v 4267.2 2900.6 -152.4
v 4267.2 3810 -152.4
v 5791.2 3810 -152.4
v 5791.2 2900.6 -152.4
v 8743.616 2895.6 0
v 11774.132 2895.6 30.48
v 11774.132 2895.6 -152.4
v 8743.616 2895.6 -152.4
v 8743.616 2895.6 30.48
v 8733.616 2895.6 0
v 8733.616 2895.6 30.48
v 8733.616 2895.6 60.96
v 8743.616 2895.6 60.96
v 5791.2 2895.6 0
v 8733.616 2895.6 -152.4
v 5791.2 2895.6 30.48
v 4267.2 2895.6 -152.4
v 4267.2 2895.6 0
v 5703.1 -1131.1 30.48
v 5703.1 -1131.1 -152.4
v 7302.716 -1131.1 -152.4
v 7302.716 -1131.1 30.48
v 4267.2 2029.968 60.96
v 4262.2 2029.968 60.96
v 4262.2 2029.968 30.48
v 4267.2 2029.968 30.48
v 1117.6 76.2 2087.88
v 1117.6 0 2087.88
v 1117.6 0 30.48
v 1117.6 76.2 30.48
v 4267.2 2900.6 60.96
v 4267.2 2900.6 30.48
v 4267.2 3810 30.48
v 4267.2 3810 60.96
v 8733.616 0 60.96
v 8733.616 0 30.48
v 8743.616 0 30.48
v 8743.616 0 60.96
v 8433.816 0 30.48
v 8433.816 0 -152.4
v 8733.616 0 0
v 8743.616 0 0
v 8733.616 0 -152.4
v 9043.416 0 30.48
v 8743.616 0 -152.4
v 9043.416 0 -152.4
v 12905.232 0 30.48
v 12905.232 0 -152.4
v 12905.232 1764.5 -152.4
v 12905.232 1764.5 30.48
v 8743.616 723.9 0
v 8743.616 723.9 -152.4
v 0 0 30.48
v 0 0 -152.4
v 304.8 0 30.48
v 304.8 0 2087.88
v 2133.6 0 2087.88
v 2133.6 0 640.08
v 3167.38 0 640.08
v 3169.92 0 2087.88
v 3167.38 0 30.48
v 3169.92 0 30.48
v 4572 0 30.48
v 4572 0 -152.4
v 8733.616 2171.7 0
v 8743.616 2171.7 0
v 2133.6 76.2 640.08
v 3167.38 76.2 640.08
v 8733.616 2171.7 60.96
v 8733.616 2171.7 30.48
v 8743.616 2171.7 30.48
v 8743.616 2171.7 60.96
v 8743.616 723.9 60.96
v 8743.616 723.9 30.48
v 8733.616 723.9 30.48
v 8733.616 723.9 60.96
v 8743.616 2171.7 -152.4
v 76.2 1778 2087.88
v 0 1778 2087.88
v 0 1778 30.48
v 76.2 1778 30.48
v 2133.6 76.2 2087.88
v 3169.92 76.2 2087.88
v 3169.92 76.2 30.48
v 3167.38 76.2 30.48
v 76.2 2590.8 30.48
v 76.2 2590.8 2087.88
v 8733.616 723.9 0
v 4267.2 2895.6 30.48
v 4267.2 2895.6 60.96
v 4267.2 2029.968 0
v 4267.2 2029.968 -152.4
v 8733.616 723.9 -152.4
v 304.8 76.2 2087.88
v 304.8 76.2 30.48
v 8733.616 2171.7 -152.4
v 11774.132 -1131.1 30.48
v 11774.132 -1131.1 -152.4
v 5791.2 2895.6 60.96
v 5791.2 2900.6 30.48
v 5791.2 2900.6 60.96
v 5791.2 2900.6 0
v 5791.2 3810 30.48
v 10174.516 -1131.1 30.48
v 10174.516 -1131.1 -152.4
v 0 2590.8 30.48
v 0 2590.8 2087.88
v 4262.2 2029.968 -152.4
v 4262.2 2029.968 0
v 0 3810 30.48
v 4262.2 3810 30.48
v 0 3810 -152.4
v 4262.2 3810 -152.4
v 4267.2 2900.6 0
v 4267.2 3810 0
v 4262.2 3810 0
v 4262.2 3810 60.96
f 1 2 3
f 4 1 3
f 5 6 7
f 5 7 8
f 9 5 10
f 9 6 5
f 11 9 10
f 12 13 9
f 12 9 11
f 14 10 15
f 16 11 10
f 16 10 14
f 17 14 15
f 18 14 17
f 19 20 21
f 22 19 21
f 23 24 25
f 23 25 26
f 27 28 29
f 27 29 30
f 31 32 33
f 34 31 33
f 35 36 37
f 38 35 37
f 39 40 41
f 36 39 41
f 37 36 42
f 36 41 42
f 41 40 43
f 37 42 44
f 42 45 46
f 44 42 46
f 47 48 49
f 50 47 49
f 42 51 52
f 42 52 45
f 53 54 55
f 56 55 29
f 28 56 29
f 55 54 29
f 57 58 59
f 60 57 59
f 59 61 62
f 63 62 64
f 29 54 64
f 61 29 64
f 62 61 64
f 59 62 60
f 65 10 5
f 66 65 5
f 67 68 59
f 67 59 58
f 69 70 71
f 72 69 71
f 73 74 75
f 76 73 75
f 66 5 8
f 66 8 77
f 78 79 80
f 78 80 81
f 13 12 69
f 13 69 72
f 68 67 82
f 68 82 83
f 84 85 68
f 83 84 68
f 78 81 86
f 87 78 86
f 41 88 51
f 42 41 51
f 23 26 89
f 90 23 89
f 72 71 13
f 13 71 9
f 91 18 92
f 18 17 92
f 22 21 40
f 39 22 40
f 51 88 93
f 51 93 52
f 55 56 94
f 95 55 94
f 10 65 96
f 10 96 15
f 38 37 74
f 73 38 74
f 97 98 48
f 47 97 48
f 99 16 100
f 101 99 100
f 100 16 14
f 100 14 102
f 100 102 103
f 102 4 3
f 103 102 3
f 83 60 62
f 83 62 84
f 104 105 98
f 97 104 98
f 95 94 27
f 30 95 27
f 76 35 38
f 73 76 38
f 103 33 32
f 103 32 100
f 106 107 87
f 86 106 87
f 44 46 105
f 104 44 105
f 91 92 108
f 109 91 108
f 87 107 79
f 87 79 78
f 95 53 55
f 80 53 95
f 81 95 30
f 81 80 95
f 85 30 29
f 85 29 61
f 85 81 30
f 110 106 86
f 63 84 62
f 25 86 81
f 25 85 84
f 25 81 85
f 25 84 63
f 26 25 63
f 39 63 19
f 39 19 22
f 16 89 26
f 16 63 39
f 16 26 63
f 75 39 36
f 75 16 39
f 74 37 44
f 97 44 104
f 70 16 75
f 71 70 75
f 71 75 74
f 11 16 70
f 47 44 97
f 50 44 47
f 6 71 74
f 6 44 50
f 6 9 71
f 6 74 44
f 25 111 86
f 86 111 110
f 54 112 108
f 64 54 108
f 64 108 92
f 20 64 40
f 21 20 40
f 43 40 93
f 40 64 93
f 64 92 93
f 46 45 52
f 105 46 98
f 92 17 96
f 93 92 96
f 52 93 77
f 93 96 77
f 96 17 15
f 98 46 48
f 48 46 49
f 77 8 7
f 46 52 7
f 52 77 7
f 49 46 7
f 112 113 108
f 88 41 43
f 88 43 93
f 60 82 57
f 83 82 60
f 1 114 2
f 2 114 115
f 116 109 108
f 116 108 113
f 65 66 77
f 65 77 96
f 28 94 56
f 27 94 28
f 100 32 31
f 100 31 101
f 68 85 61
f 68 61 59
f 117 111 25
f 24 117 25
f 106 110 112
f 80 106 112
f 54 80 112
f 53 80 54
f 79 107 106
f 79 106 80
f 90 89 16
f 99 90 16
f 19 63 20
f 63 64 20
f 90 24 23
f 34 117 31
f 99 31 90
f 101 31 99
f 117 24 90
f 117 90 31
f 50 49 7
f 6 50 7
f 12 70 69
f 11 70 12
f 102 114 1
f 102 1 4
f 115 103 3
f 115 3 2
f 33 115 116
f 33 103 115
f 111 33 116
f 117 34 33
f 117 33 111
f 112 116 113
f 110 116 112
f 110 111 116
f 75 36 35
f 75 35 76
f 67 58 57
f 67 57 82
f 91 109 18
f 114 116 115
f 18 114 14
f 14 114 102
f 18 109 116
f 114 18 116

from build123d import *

# Parameters (mm, degrees)
F0_W          = 1524
F0_H          = 5
F1_DEPTH      = 60.96
F0_W_2        = 5
F0_H_2        = 723.9
F0_W_3        = 5.000104126
F0_W_4        = 2286
F0_H_3        = 914.4
F0_W_5        = 1828.8
F0_H_4        = 487.68
F0_W_6        = 1310.64
F0_H_5        = 457.2
F0_W_7        = 990.6
F0_H_6        = 609.6
F0_W_8        = 914.4
F0_H_7        = 1524
F0_W_9        = 1584.96
F0_H_8        = 2157.984
F0_W_10       = 3352.8
F0_H_9        = 909.4
F0_H_10       = 280.416
F2_DEPTH      = 30.48
F4_W          = 76.2
F4_H          = 812.8
F4_W_2        = 812.8
F4_H_2        = 76.2
F4_W_3        = 1036.32
F5_DEPTH      = 2057.4
F6_W          = 1033.78
F6_H          = 609.6
F7_DEPTH      = 1207.3007187053
F8_DEPTH      = 152.4
F9_DEPTH      = 152.4
F9_DEPTH_BACK = 30.48


with BuildPart() as f1:
    # F0 (on Top) → F1 (new body)
    with BuildSketch(Plane.XY):
        with Locations((5029.2, 2898.1)):
            Rectangle(F0_W, F0_H)
        Polygon((4262.2, 3810), (4262.2, 2029.968), (4267.2, 2029.968), (4267.2, 2895.6), (4267.2, 2900.6), (4267.2, 3810), align=None)
    extrude(amount=F1_DEPTH)


with BuildPart() as f1b:
    # F0 (on Top) → F1, piece 2 (new body)
    with BuildSketch(Plane.XY):
        with Locations((8736.116, 2533.65)):
            Rectangle(F0_W_2, F0_H_2)
        with Locations((8741.116052063, 2533.65)):
            Rectangle(F0_W_3, F0_H_2)
    extrude(amount=F1_DEPTH)


with BuildPart() as f1c:
    # F0 (on Top) → F1, piece 3 (new body)
    with BuildSketch(Plane.XY):
        with Locations((8736.116, 361.95)):
            Rectangle(F0_W_2, F0_H_2)
        with Locations((8741.116052063, 361.95)):
            Rectangle(F0_W_3, F0_H_2)
    extrude(amount=F1_DEPTH)


with BuildPart() as f2:
    # F0 (on Top) → F2 (new body)
    with BuildSketch(Plane.XY):
        Polygon((4267.2, 2029.968), (4267.2, 0), (4572, 0), (5703.0997187053, -1131.0997187053), (7302.7162812947, -1131.0997187053), (8433.816, 0), (8733.616, 0), (8733.616, 723.9), (8698.4546220885, 723.9), (8698.4546220885, 2171.7), (8733.616, 2171.7), (8733.616, 2895.6), (7519.416, 2895.6), (5791.2, 2895.6), (4267.2, 2895.6), align=None)
        Polygon((5281.1117777896, 222.5019009471), (4530.6882699943, 90.1819895649), (4398.3683586121, 840.6054973602), (5148.7918664074, 972.9254087424), align=None, mode=Mode.SUBTRACT)
        with Locations((6496.5029158592, -289.0089195251)):
            Rectangle(F0_W_4, F0_H_3, mode=Mode.SUBTRACT)
        with BuildLine():
            ThreePointArc((5519.6326080322, 825.3382080503), (5249.6043507385, 1099.6246337891), (5519.6326080322, 1373.9110595278))
            Line((5519.6326080322, 1373.9110595278), (5519.6326080322, 2072.8167237282))
            Line((5519.6326080322, 2072.8167237282), (7958.0326080322, 2072.8167237282))
            Line((7958.0326080322, 2072.8167237282), (7958.0326080322, 396.4167237282))
            Line((7958.0326080322, 396.4167237282), (5519.6326080322, 396.4167237282))
            Line((5519.6326080322, 396.4167237282), (5519.6326080322, 825.3382080503))
        make_face(mode=Mode.SUBTRACT)
        Polygon((4384.2396736145, 1269.1645622253), (4516.5595849967, 2019.5880700206), (5266.983092792, 1887.2681586384), (5134.6631814098, 1136.8446508431), align=None, mode=Mode.SUBTRACT)
        with Locations((6661.3005584717, 2568.1438237762)):
            Rectangle(F0_W_5, F0_H_4, mode=Mode.SUBTRACT)
        Polygon((9552.432, 2895.6), (8743.616104126, 2895.6), (8743.616104126, 2171.7), (8778.7773779115, 2171.7), (8778.7773779115, 723.9), (8743.616104126, 723.9), (8743.616104126, 0), (9043.416, 0), (10174.5157187053, -1131.0997187053), (11774.1322812947, -1131.0997187053), (12905.232, 0), (12905.232, 1764.5002812947), (11774.1322812947, 2895.6), align=None)
        with Locations((11014.7964245605, -810.0562347412)):
            Rectangle(F0_W_6, F0_H_5, mode=Mode.SUBTRACT)
        with Locations((9298.3338287354, 2534.5547534943)):
            Rectangle(F0_W_7, F0_H_6, mode=Mode.SUBTRACT)
        Polygon((10127.4194717407, 2522.1054672089), (10127.4194717407, 2802.5214672089), (11712.3794717407, 2802.5214672089), (11712.3794717407, 2522.1054672089), (11712.3794717407, 364.1214672089), (10127.4194717407, 364.1214672089), align=None, mode=Mode.SUBTRACT)
        Polygon((0, 2009.85455513), (0, 0), (304.8, 0), (1118.616, 0), (3352.8, 0), (3352.8, 2029.968), (4262.2, 2029.968), (4262.2, 3810), (3352.8, 3810), (3352.8, 3200.4), (0, 3200.4), (0, 2823.67055513), align=None)
        with Locations((2210.8657863617, 1090.4223377705)):
            Rectangle(F0_W_8, F0_H_7, mode=Mode.SUBTRACT)
        with BuildLine():
            ThreePointArc((5519.6326080322, 1373.9110595278), (5716.3745411006, 1295.1096373817), (5798.2443507385, 1099.6246337891))
            ThreePointArc((5798.2443507385, 1099.6246337891), (5716.3745411006, 904.1396301965), (5519.6326080322, 825.3382080503))
            Line((5519.6326080322, 825.3382080503), (5519.6326080322, 396.4167237282))
            Line((5519.6326080322, 396.4167237282), (7958.0326080322, 396.4167237282))
            Line((7958.0326080322, 396.4167237282), (7958.0326080322, 2072.8167237282))
            Line((7958.0326080322, 2072.8167237282), (5519.6326080322, 2072.8167237282))
            Line((5519.6326080322, 2072.8167237282), (5519.6326080322, 1373.9110595278))
        make_face()
        with Locations((10919.8994717407, 1443.1134672089)):
            Rectangle(F0_W_9, F0_H_8)
        with Locations((6496.5029158592, -289.0089195251)):
            Rectangle(F0_W_4, F0_H_3)
        with Locations((1676.4, 3505.2)):
            Rectangle(F0_W_10, F0_H_6)
        with Locations((2210.8657863617, 1090.4223377705)):
            Rectangle(F0_W_8, F0_H_7)
        with Locations((5029.2, 3355.3)):
            Rectangle(F0_W, F0_H_9)
        with Locations((6661.3005584717, 2568.1438237762)):
            Rectangle(F0_W_5, F0_H_4)
        with Locations((9298.3338287354, 2534.5547534943)):
            Rectangle(F0_W_7, F0_H_6)
        with Locations((11014.7964245605, -810.0562347412)):
            Rectangle(F0_W_6, F0_H_5)
        Polygon((4398.3683586121, 840.6054973602), (4530.6882699943, 90.1819895649), (5281.1117777896, 222.5019009471), (5148.7918664074, 972.9254087424), align=None)
        Polygon((5266.983092792, 1887.2681586384), (4516.5595849967, 2019.5880700206), (4384.2396736145, 1269.1645622253), (5134.6631814098, 1136.8446508431), align=None)
        with Locations((10919.8994717407, 2662.3134672089)):
            Rectangle(F0_W_9, F0_H_10)
        with BuildLine():
            ThreePointArc((5519.6326080322, 825.3382080503), (5716.3745411006, 904.1396301965), (5798.2443507385, 1099.6246337891))
            ThreePointArc((5798.2443507385, 1099.6246337891), (5716.3745411006, 1295.1096373817), (5519.6326080322, 1373.9110595278))
            Line((5519.6326080322, 1373.9110595278), (5519.6326080322, 825.3382080503))
        make_face()
        Polygon((8738.616, 2171.7), (8733.616, 2171.7), (8698.4546220885, 2171.7), (8698.4546220885, 723.9), (8733.616, 723.9), (8738.616, 723.9), (8743.616104126, 723.9), (8778.7773779115, 723.9), (8778.7773779115, 2171.7), (8743.616104126, 2171.7), align=None)
        with BuildLine():
            Line((5519.6326080322, 825.3382080503), (5519.6326080322, 1373.9110595278))
            ThreePointArc((5519.6326080322, 1373.9110595278), (5249.6043507385, 1099.6246337891), (5519.6326080322, 825.3382080503))
        make_face()
        Polygon((4262.2, 3810), (4262.2, 2029.968), (4267.2, 2029.968), (4267.2, 2895.6), (4267.2, 2900.6), (4267.2, 3810), align=None)
        with Locations((5029.2, 2898.1)):
            Rectangle(F0_W, F0_H)
        with Locations((8741.116052063, 361.95)):
            Rectangle(F0_W_3, F0_H_2)
        with Locations((8741.116052063, 2533.65)):
            Rectangle(F0_W_3, F0_H_2)
        with Locations((8736.116, 361.95)):
            Rectangle(F0_W_2, F0_H_2)
        with Locations((8736.116, 2533.65)):
            Rectangle(F0_W_2, F0_H_2)
    extrude(amount=F2_DEPTH)


with BuildPart() as f1_1:
    add(f1.part)

    # F3: union F1b, F1c, F2
    add(f1b.part)
    add(f1c.part)
    add(f2.part)

    # F4 (on face) → F5 (join)
    with BuildSketch(Plane.XY.offset(30.48)):
        with Locations((38.1, 2184.4)):
            Rectangle(F4_W, F4_H)
        with Locations((711.2, 38.1)):
            Rectangle(F4_W_2, F4_H_2)
        with Locations((2651.76, 38.1)):
            Rectangle(F4_W_3, F4_H_2)
    extrude(amount=F5_DEPTH)

    # F6 (on face) → F7 (cut, through all)
    with BuildSketch(Plane(origin=(0, 76.2, 0), x_dir=(-1, 0, 0), z_dir=(0, 1, 0))):
        with Locations((-2650.49, 335.28)):
            Rectangle(F6_W, F6_H)
    extrude(amount=-F7_DEPTH, mode=Mode.SUBTRACT)

    # F0 (on Top) → F8 (join)
    with BuildSketch(Plane.XY):
        Polygon((0, 2009.85455513), (0, 0), (304.8, 0), (1118.616, 0), (3352.8, 0), (3352.8, 2029.968), (4262.2, 2029.968), (4262.2, 3810), (3352.8, 3810), (3352.8, 3200.4), (0, 3200.4), (0, 2823.67055513), align=None)
        with Locations((2210.8657863617, 1090.4223377705)):
            Rectangle(F0_W_8, F0_H_7, mode=Mode.SUBTRACT)
        with Locations((1676.4, 3505.2)):
            Rectangle(F0_W_10, F0_H_6)
        with Locations((2210.8657863617, 1090.4223377705)):
            Rectangle(F0_W_8, F0_H_7)
        Polygon((4267.2, 2029.968), (4267.2, 0), (4572, 0), (5703.0997187053, -1131.0997187053), (7302.7162812947, -1131.0997187053), (8433.816, 0), (8733.616, 0), (8733.616, 723.9), (8698.4546220885, 723.9), (8698.4546220885, 2171.7), (8733.616, 2171.7), (8733.616, 2895.6), (7519.416, 2895.6), (5791.2, 2895.6), (4267.2, 2895.6), align=None)
        Polygon((5281.1117777896, 222.5019009471), (4530.6882699943, 90.1819895649), (4398.3683586121, 840.6054973602), (5148.7918664074, 972.9254087424), align=None, mode=Mode.SUBTRACT)
        with Locations((6496.5029158592, -289.0089195251)):
            Rectangle(F0_W_4, F0_H_3, mode=Mode.SUBTRACT)
        with BuildLine():
            ThreePointArc((5519.6326080322, 825.3382080503), (5249.6043507385, 1099.6246337891), (5519.6326080322, 1373.9110595278))
            Line((5519.6326080322, 1373.9110595278), (5519.6326080322, 2072.8167237282))
            Line((5519.6326080322, 2072.8167237282), (7958.0326080322, 2072.8167237282))
            Line((7958.0326080322, 2072.8167237282), (7958.0326080322, 396.4167237282))
            Line((7958.0326080322, 396.4167237282), (5519.6326080322, 396.4167237282))
            Line((5519.6326080322, 396.4167237282), (5519.6326080322, 825.3382080503))
        make_face(mode=Mode.SUBTRACT)
        Polygon((4384.2396736145, 1269.1645622253), (4516.5595849967, 2019.5880700206), (5266.983092792, 1887.2681586384), (5134.6631814098, 1136.8446508431), align=None, mode=Mode.SUBTRACT)
        with Locations((6661.3005584717, 2568.1438237762)):
            Rectangle(F0_W_5, F0_H_4, mode=Mode.SUBTRACT)
        Polygon((4398.3683586121, 840.6054973602), (4530.6882699943, 90.1819895649), (5281.1117777896, 222.5019009471), (5148.7918664074, 972.9254087424), align=None)
        Polygon((5266.983092792, 1887.2681586384), (4516.5595849967, 2019.5880700206), (4384.2396736145, 1269.1645622253), (5134.6631814098, 1136.8446508431), align=None)
        with BuildLine():
            ThreePointArc((5519.6326080322, 1373.9110595278), (5716.3745411006, 1295.1096373817), (5798.2443507385, 1099.6246337891))
            ThreePointArc((5798.2443507385, 1099.6246337891), (5716.3745411006, 904.1396301965), (5519.6326080322, 825.3382080503))
            Line((5519.6326080322, 825.3382080503), (5519.6326080322, 396.4167237282))
            Line((5519.6326080322, 396.4167237282), (7958.0326080322, 396.4167237282))
            Line((7958.0326080322, 396.4167237282), (7958.0326080322, 2072.8167237282))
            Line((7958.0326080322, 2072.8167237282), (5519.6326080322, 2072.8167237282))
            Line((5519.6326080322, 2072.8167237282), (5519.6326080322, 1373.9110595278))
        make_face()
        with Locations((6496.5029158592, -289.0089195251)):
            Rectangle(F0_W_4, F0_H_3)
        with Locations((6661.3005584717, 2568.1438237762)):
            Rectangle(F0_W_5, F0_H_4)
        with Locations((5029.2, 3355.3)):
            Rectangle(F0_W, F0_H_9)
        with BuildLine():
            ThreePointArc((5519.6326080322, 825.3382080503), (5716.3745411006, 904.1396301965), (5798.2443507385, 1099.6246337891))
            ThreePointArc((5798.2443507385, 1099.6246337891), (5716.3745411006, 1295.1096373817), (5519.6326080322, 1373.9110595278))
            Line((5519.6326080322, 1373.9110595278), (5519.6326080322, 825.3382080503))
        make_face()
        with BuildLine():
            Line((5519.6326080322, 825.3382080503), (5519.6326080322, 1373.9110595278))
            ThreePointArc((5519.6326080322, 1373.9110595278), (5249.6043507385, 1099.6246337891), (5519.6326080322, 825.3382080503))
        make_face()
        Polygon((9552.432, 2895.6), (8743.616104126, 2895.6), (8743.616104126, 2171.7), (8778.7773779115, 2171.7), (8778.7773779115, 723.9), (8743.616104126, 723.9), (8743.616104126, 0), (9043.416, 0), (10174.5157187053, -1131.0997187053), (11774.1322812947, -1131.0997187053), (12905.232, 0), (12905.232, 1764.5002812947), (11774.1322812947, 2895.6), align=None)
        with Locations((11014.7964245605, -810.0562347412)):
            Rectangle(F0_W_6, F0_H_5, mode=Mode.SUBTRACT)
        with Locations((9298.3338287354, 2534.5547534943)):
            Rectangle(F0_W_7, F0_H_6, mode=Mode.SUBTRACT)
        Polygon((10127.4194717407, 2522.1054672089), (10127.4194717407, 2802.5214672089), (11712.3794717407, 2802.5214672089), (11712.3794717407, 2522.1054672089), (11712.3794717407, 364.1214672089), (10127.4194717407, 364.1214672089), align=None, mode=Mode.SUBTRACT)
        with Locations((10919.8994717407, 1443.1134672089)):
            Rectangle(F0_W_9, F0_H_8)
        with Locations((11014.7964245605, -810.0562347412)):
            Rectangle(F0_W_6, F0_H_5)
        with Locations((10919.8994717407, 2662.3134672089)):
            Rectangle(F0_W_9, F0_H_10)
        with Locations((9298.3338287354, 2534.5547534943)):
            Rectangle(F0_W_7, F0_H_6)
        Polygon((8738.616, 2171.7), (8733.616, 2171.7), (8698.4546220885, 2171.7), (8698.4546220885, 723.9), (8733.616, 723.9), (8738.616, 723.9), (8743.616104126, 723.9), (8778.7773779115, 723.9), (8778.7773779115, 2171.7), (8743.616104126, 2171.7), align=None)
    extrude(amount=-F8_DEPTH)

    # F0 (on Top) → F9 (join, two sides)
    with BuildSketch(Plane.XY) as f9_sk:
        Polygon((3352.8, 2029.968), (3352.8, 0), (4267.2, 0), (4267.2, 2029.968), (4262.2, 2029.968), align=None)
    extrude(amount=-F9_DEPTH)
    extrude(f9_sk.sketch, amount=F9_DEPTH_BACK)


solid = f1_1.part
